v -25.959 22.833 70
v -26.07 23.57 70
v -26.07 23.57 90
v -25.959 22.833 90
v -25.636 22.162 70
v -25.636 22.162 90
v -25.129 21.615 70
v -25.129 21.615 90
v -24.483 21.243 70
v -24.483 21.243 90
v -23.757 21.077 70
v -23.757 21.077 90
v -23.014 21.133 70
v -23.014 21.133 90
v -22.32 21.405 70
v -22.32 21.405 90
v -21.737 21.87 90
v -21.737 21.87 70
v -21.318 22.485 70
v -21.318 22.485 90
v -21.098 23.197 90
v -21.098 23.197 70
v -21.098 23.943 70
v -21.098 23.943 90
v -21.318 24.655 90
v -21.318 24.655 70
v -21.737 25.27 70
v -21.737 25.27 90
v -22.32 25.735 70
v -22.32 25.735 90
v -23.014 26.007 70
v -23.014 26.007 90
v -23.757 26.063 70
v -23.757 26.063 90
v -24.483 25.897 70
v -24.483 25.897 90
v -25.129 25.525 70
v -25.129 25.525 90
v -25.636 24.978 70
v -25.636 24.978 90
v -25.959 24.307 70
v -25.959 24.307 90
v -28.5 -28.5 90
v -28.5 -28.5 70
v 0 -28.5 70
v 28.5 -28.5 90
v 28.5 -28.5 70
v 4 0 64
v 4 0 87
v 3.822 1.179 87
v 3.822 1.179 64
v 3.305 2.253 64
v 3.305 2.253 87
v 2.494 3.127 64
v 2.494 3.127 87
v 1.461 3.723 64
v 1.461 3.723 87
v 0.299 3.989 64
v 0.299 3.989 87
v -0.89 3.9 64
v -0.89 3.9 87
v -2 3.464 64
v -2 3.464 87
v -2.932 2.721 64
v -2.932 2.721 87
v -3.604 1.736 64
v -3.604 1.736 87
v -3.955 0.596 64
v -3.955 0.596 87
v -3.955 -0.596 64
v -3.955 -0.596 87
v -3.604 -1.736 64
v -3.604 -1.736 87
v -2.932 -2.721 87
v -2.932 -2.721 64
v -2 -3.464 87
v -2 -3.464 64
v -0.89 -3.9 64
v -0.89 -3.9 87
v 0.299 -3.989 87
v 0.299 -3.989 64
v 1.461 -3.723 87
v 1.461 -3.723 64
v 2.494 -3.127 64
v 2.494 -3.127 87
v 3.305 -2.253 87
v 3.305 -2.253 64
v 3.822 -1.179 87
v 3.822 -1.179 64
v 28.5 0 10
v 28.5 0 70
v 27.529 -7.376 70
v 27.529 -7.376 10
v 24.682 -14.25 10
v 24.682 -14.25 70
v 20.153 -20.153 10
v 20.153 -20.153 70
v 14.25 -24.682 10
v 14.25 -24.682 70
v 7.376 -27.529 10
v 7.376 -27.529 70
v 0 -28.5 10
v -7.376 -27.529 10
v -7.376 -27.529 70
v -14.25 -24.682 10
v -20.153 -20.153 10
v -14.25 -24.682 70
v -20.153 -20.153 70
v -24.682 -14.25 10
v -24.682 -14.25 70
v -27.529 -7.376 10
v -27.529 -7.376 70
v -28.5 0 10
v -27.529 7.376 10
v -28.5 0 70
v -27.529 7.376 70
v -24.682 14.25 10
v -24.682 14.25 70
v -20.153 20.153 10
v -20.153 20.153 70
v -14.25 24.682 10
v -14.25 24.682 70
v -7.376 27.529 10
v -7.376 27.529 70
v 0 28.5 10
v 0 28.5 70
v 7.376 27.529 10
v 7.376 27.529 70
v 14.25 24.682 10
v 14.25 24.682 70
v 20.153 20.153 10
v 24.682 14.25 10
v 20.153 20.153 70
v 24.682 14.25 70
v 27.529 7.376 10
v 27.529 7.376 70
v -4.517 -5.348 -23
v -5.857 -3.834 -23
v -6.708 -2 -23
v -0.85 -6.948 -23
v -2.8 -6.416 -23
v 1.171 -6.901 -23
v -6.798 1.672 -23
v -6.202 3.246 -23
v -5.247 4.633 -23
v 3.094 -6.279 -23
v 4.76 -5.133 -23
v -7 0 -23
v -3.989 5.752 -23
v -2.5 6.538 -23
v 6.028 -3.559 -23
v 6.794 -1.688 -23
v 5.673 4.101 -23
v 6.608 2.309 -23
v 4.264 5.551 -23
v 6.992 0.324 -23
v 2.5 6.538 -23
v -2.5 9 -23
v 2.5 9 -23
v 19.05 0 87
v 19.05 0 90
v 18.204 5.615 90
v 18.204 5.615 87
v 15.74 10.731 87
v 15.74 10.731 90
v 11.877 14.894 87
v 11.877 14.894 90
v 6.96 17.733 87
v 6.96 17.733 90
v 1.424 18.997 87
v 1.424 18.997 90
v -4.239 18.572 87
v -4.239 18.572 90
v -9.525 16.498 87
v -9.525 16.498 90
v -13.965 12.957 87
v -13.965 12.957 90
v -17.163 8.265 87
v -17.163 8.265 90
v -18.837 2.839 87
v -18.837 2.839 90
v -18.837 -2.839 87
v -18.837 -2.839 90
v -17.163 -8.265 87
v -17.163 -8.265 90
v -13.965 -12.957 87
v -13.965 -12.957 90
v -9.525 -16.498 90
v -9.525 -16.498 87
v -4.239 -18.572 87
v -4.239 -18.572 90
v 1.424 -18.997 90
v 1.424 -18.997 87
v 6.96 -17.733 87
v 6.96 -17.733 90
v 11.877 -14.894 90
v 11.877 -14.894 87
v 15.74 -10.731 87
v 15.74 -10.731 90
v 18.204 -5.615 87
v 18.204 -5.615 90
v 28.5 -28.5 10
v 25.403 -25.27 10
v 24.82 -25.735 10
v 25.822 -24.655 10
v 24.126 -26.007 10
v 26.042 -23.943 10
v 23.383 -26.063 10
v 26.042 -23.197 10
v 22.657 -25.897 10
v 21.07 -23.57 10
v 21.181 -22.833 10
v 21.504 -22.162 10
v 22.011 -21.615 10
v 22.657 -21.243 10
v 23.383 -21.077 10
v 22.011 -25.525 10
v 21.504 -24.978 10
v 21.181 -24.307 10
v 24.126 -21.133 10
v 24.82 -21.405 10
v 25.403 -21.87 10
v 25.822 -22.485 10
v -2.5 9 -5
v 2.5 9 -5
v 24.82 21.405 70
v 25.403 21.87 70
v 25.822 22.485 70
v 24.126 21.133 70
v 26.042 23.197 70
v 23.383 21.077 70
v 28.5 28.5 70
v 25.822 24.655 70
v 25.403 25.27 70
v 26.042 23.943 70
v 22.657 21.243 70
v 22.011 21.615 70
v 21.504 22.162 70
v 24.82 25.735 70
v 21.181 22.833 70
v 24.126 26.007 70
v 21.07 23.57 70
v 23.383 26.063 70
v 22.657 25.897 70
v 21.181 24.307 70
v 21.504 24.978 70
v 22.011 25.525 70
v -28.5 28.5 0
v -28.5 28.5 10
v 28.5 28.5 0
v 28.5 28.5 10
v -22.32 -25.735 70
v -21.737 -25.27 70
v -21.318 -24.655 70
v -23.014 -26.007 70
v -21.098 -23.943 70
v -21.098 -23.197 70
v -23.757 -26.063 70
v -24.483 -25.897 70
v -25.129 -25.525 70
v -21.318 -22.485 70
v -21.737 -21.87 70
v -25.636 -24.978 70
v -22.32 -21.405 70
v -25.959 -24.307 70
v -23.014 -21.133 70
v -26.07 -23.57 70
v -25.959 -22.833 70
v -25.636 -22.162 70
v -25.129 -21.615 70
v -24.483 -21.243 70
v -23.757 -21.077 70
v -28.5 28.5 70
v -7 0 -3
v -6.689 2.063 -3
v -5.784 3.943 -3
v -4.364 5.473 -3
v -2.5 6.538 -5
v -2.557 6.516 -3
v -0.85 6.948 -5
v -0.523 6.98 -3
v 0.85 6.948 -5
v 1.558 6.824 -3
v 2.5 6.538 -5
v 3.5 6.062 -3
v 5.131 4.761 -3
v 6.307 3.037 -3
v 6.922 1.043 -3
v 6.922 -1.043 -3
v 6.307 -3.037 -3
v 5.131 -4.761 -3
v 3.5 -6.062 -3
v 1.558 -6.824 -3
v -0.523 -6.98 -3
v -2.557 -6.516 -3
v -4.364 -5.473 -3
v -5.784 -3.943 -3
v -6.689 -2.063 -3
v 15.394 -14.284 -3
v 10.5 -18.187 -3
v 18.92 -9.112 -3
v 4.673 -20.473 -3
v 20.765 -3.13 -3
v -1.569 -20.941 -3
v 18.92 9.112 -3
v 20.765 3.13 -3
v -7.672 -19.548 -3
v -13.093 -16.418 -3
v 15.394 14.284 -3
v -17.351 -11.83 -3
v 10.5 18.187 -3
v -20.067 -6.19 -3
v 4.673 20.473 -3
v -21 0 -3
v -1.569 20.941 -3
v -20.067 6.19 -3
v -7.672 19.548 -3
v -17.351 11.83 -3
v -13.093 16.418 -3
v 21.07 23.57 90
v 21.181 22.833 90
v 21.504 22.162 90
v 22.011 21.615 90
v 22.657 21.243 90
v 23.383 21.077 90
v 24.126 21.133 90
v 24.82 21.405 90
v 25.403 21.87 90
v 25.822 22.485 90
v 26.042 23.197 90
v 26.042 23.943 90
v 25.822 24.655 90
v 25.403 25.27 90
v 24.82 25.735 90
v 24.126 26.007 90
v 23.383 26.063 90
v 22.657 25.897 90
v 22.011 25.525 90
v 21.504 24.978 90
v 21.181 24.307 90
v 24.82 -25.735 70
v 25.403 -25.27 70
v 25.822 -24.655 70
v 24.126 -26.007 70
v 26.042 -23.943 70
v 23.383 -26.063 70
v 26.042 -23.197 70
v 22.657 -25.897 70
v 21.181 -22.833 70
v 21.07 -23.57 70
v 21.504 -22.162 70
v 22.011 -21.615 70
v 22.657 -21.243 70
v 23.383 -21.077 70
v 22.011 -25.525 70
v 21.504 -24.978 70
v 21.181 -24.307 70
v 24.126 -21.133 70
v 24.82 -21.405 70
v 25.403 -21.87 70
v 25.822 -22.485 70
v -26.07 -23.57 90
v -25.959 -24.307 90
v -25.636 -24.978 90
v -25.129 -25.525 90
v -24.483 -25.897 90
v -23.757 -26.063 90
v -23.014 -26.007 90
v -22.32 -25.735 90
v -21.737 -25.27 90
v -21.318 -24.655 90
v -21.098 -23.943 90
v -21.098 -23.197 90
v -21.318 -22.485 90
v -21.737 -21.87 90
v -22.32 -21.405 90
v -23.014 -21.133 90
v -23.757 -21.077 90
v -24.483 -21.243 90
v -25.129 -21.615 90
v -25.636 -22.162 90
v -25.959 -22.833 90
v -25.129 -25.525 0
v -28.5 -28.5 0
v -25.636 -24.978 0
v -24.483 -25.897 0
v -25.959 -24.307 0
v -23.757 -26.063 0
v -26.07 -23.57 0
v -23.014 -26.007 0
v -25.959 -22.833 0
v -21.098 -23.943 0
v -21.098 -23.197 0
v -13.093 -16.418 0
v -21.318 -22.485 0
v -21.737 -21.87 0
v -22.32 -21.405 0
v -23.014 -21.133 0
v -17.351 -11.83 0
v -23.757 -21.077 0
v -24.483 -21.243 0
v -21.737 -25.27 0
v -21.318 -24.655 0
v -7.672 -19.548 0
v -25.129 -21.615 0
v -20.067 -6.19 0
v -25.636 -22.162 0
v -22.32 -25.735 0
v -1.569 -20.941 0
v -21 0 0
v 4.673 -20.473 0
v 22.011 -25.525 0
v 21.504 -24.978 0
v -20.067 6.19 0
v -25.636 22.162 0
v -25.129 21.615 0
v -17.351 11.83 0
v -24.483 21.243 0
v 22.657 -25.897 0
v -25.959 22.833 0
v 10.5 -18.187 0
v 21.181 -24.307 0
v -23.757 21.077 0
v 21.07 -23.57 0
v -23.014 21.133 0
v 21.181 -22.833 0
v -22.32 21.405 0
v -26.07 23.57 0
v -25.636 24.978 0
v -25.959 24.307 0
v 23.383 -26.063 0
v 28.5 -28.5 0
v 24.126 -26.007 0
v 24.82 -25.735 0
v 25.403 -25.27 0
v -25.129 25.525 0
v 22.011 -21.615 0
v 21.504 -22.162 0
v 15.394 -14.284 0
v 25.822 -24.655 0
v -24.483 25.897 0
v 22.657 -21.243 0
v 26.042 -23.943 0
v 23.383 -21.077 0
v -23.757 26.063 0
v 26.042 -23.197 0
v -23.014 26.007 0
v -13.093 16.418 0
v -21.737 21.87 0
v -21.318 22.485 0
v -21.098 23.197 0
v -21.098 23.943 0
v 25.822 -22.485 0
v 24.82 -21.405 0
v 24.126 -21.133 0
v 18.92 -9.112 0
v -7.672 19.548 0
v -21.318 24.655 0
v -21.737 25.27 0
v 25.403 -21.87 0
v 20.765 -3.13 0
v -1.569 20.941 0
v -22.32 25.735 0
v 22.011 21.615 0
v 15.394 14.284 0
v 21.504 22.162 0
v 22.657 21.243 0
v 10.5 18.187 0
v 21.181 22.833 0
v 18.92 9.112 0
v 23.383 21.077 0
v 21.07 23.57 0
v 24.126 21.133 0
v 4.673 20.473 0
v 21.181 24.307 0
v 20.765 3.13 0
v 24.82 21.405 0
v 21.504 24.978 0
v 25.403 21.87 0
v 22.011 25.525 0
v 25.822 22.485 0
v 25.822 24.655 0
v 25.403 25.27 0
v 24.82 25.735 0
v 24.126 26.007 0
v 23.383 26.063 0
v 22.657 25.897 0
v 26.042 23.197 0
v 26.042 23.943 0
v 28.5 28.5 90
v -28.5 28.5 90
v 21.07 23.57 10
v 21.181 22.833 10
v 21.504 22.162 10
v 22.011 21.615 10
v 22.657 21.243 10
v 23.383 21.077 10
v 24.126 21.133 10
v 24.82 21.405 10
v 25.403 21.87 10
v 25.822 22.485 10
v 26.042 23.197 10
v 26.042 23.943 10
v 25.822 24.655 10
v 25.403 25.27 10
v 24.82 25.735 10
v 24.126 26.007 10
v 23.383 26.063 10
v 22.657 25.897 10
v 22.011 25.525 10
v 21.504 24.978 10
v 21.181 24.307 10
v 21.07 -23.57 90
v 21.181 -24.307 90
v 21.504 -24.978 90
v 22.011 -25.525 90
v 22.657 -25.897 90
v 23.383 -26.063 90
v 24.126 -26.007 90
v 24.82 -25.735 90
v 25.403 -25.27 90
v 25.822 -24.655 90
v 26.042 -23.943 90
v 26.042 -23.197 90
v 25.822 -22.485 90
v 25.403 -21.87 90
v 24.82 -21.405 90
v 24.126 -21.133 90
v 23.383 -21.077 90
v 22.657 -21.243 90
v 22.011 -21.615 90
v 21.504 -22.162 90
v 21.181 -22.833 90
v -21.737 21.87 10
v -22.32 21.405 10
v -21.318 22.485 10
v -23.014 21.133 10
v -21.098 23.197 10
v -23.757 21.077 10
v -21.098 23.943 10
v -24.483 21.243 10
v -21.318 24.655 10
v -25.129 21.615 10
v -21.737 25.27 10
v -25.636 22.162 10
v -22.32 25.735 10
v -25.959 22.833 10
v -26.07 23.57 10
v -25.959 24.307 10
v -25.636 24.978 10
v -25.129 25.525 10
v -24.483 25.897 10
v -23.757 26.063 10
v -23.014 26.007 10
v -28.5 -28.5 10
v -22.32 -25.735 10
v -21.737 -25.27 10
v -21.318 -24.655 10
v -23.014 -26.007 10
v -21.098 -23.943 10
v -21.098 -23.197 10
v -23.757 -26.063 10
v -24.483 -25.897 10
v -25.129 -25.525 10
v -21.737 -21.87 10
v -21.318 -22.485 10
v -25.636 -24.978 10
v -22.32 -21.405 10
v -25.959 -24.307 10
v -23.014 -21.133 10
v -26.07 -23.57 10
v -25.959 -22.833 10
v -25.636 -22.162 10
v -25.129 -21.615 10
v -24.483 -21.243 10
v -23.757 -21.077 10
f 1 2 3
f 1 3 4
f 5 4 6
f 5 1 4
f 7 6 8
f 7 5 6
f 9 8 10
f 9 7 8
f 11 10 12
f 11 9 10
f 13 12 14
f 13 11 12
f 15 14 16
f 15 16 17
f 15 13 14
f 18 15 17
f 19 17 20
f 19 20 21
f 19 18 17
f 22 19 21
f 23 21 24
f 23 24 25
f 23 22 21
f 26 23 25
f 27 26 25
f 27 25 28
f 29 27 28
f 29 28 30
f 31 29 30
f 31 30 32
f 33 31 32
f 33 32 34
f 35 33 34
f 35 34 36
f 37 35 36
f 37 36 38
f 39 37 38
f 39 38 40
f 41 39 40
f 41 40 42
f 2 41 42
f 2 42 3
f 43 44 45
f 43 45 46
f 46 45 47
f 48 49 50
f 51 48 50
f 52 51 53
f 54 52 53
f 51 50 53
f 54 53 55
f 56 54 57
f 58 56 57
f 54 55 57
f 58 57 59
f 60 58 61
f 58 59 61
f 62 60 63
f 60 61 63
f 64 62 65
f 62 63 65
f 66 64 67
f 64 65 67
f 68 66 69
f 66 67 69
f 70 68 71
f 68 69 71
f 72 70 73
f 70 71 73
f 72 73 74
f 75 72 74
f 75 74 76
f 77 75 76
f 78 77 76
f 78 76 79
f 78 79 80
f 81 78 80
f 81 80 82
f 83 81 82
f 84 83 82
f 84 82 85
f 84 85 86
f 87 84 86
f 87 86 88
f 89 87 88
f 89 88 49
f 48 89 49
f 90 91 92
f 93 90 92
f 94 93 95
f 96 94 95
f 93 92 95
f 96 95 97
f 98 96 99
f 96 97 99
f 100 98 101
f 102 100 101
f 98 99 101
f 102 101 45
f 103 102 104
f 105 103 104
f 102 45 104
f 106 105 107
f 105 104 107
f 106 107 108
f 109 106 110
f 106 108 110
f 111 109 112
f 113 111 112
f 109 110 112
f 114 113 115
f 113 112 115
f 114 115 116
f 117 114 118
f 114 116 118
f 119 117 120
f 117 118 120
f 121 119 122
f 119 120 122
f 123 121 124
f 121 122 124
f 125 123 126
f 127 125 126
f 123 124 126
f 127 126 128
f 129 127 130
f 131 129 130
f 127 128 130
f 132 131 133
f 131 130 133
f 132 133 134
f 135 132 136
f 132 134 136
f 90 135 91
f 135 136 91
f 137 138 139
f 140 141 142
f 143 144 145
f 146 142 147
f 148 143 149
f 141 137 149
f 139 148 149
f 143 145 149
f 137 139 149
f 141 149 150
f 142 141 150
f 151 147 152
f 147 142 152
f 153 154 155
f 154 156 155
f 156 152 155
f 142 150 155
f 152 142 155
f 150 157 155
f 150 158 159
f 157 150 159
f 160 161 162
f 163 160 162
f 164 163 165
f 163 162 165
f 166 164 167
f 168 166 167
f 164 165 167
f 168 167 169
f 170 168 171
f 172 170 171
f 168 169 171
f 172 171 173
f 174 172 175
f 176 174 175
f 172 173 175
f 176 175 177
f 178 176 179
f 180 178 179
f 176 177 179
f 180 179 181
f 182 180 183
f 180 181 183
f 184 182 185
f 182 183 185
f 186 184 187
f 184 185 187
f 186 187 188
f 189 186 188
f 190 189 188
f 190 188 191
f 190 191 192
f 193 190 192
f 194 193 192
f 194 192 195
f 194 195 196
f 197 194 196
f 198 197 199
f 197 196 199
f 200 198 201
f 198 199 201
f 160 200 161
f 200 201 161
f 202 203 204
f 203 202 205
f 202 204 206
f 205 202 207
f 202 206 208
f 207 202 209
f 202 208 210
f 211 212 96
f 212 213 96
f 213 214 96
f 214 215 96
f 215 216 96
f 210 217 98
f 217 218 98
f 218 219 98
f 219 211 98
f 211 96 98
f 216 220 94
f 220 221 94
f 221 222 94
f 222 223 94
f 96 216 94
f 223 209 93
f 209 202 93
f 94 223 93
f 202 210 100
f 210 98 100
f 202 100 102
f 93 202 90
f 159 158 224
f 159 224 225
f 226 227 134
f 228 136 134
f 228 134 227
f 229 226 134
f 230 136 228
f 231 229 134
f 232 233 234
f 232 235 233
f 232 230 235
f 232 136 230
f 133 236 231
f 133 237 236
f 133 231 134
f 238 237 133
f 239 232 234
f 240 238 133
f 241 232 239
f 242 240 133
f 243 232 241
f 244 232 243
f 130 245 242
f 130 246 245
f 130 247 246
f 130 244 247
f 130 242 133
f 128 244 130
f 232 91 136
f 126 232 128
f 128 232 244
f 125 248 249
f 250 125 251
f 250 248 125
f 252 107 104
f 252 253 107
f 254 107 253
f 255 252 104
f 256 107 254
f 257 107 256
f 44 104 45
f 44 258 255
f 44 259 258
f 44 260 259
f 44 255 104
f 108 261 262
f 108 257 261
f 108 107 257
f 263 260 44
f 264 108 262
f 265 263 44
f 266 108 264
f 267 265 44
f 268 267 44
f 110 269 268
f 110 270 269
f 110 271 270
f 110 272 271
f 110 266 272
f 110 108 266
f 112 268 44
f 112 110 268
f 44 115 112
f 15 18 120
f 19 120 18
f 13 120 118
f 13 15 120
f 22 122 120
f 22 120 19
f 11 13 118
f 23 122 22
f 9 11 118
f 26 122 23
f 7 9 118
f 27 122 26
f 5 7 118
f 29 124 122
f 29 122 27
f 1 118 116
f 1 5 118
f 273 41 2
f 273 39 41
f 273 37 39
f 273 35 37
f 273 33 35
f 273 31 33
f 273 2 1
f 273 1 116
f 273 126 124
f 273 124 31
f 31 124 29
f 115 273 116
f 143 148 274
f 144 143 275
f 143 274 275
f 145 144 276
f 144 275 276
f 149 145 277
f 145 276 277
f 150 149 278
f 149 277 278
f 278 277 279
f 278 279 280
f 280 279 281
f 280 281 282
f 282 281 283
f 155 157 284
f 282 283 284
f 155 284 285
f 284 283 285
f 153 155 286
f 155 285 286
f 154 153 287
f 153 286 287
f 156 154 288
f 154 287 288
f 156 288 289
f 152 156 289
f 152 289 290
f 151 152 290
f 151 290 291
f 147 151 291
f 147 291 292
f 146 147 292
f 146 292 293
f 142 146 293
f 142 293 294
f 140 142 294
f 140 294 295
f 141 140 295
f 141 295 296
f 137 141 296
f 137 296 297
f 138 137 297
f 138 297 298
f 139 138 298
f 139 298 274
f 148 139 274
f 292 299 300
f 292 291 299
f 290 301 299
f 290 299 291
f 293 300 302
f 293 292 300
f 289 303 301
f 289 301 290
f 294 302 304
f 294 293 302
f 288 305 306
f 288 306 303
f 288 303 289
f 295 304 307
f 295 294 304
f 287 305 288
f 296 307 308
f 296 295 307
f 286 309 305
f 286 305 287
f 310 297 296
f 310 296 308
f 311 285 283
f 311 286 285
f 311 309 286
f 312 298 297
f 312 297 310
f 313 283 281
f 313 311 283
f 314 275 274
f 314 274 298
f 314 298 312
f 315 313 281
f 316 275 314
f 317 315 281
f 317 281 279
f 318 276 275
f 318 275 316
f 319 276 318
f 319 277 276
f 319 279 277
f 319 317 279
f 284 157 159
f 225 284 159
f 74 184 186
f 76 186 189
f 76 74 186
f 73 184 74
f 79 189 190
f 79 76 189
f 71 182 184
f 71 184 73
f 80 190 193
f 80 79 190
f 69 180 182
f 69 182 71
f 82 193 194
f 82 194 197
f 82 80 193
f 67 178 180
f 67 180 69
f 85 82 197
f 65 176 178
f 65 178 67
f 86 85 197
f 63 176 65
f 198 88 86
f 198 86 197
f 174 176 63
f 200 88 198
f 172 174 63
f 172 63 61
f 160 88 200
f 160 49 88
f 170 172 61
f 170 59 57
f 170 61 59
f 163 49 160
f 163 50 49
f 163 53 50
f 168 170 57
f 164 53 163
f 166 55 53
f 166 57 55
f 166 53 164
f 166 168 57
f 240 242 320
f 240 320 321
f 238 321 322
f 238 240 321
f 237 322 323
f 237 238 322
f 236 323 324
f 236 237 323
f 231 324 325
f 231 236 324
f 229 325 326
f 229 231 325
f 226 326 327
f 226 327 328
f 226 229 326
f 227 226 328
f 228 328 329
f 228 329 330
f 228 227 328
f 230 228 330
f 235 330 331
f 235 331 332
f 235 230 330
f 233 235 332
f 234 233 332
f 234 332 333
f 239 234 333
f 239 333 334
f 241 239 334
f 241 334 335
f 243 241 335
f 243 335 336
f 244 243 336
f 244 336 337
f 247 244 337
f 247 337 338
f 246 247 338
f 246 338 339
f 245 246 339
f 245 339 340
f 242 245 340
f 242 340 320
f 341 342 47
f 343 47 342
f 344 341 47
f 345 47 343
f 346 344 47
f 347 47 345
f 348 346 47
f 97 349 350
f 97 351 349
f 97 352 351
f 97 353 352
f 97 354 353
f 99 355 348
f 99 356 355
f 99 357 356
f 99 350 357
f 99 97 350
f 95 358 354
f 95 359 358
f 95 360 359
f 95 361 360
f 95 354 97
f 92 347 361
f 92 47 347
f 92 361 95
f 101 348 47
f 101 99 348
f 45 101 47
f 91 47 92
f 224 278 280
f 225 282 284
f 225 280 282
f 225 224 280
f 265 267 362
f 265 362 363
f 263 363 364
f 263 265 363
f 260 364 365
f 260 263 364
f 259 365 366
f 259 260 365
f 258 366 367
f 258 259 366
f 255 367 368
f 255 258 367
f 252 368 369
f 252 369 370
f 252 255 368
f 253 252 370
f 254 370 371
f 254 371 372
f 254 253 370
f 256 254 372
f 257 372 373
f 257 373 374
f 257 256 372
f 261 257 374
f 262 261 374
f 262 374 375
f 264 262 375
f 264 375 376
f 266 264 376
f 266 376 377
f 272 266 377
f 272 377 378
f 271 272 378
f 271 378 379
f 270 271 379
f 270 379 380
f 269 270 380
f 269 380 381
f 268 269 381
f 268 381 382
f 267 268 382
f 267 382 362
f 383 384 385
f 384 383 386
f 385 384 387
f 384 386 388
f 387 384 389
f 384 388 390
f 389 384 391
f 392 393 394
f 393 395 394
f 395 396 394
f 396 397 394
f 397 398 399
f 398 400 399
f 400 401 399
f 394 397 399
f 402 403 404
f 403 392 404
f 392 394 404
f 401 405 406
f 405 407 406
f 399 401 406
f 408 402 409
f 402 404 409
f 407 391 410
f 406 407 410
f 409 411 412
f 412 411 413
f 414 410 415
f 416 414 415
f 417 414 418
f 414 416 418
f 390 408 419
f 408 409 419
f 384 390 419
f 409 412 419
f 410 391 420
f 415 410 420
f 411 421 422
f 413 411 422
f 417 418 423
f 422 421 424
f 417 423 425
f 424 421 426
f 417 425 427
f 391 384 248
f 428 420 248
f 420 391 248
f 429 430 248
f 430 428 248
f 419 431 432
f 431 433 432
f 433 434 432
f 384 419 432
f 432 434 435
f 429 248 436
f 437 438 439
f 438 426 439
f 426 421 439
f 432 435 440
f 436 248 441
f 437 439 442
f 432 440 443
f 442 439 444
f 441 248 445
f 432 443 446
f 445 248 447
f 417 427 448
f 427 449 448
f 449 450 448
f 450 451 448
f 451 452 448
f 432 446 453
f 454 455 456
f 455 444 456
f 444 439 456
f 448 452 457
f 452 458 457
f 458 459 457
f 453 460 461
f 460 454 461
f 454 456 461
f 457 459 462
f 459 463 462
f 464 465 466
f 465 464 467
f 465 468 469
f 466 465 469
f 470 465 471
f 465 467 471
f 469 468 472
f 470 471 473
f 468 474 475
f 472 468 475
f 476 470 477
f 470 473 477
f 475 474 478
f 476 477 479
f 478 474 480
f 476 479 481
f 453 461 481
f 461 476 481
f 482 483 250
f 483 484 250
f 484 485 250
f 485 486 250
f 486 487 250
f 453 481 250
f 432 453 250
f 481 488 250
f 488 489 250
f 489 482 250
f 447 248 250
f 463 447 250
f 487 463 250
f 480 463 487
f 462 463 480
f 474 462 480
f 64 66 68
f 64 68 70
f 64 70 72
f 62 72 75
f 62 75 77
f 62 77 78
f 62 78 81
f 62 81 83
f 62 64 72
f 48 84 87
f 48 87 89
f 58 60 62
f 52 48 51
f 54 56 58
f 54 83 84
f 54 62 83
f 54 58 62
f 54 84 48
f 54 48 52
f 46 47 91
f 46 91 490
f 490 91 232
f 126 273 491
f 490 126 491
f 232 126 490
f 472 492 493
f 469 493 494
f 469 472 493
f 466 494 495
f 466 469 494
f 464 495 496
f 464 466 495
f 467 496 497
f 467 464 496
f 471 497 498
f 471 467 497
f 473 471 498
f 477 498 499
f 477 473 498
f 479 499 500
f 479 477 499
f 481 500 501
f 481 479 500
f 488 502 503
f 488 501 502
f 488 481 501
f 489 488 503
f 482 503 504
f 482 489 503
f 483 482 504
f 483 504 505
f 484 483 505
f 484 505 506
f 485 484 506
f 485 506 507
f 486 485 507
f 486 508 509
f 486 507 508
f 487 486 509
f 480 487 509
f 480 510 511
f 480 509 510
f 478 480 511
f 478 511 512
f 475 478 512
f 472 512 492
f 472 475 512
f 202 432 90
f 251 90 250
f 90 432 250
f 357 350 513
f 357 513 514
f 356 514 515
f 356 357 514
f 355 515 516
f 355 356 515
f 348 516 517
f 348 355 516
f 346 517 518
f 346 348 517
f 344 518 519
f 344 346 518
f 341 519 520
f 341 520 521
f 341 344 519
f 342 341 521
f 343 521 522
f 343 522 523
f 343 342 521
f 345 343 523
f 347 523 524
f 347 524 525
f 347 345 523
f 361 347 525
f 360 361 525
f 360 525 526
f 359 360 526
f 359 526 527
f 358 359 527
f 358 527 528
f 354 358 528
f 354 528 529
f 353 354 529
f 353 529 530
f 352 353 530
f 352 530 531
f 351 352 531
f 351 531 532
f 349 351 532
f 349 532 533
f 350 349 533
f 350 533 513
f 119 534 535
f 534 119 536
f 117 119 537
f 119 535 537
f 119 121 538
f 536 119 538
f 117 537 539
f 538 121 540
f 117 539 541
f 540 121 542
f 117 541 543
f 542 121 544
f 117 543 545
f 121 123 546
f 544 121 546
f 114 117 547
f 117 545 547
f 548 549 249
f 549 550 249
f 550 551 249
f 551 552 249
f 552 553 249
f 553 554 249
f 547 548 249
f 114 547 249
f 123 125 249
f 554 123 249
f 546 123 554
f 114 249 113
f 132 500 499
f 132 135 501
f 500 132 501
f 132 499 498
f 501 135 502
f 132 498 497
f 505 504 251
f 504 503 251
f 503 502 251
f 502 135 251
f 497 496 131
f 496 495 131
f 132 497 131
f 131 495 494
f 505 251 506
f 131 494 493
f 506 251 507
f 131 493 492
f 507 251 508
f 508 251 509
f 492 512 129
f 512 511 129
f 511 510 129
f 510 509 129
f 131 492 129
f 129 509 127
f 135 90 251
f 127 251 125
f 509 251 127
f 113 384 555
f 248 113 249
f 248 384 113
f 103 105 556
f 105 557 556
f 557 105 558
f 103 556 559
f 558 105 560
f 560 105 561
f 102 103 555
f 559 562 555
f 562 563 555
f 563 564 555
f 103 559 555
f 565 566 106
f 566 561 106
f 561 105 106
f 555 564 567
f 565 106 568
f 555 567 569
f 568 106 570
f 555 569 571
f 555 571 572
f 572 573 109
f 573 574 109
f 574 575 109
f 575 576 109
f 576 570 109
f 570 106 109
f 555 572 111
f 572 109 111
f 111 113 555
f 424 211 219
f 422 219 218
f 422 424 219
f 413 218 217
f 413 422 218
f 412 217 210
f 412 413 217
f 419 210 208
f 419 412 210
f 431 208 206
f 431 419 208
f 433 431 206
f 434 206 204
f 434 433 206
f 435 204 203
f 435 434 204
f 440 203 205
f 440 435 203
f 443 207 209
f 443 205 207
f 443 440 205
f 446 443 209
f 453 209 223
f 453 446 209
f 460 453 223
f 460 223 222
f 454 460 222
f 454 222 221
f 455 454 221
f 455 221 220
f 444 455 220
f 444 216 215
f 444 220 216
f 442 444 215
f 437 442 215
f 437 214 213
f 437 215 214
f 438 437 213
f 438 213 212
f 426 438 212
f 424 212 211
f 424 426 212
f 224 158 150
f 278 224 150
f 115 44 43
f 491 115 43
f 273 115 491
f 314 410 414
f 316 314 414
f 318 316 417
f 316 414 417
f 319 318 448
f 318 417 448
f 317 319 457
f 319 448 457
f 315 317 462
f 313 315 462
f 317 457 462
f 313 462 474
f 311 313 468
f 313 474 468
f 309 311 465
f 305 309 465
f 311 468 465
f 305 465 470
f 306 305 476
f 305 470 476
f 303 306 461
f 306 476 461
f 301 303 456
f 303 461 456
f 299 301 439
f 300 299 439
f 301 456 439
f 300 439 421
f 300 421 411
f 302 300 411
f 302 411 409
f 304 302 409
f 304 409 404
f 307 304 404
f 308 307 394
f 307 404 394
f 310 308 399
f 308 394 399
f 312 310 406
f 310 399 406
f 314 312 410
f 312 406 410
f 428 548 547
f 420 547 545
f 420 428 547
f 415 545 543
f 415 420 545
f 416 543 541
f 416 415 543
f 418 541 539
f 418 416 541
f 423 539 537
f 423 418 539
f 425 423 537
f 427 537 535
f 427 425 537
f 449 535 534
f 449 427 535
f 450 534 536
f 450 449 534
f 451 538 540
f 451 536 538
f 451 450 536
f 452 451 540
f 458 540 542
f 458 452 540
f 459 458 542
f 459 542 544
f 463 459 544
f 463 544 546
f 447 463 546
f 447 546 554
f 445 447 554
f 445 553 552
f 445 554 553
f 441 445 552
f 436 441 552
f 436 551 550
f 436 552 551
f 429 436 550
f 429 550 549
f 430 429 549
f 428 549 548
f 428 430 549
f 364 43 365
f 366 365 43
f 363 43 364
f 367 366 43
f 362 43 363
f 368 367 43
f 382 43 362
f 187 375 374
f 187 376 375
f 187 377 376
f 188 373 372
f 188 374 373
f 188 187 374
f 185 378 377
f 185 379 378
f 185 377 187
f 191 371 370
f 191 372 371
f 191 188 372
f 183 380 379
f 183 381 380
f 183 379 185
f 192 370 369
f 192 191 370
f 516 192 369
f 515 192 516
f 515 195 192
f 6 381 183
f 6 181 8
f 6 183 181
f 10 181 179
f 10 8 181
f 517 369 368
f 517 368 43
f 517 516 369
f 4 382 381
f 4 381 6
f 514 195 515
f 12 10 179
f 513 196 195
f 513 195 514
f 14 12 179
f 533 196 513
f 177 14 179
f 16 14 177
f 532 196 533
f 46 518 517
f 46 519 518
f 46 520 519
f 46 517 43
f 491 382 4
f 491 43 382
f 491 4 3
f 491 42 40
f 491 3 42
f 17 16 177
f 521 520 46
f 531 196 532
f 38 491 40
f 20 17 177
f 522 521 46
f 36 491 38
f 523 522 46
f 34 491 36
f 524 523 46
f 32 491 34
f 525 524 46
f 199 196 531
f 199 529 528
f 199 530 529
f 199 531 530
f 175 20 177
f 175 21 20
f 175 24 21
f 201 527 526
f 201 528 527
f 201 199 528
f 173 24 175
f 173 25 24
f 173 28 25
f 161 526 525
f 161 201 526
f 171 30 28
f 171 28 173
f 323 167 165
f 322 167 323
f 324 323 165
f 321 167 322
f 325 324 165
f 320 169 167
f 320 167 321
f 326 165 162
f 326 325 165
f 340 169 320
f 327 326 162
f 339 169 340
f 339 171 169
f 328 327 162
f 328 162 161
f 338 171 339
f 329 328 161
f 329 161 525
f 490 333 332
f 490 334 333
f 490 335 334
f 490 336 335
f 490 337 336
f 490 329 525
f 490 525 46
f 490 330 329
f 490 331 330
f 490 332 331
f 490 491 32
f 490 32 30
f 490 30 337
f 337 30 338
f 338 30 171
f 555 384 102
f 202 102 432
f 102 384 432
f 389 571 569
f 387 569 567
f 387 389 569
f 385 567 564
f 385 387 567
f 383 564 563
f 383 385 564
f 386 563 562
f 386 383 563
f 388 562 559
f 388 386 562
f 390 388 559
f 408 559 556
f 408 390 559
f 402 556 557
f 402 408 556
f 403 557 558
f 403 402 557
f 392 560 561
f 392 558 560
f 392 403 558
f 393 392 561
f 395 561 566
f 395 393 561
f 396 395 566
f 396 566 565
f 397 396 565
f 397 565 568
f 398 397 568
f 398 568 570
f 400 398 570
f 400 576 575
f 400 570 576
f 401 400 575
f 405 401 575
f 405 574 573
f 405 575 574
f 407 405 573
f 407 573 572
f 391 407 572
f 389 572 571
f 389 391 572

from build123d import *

# Parameters (mm, degrees)
SKETCH_1_W               = 57
SKETCH_1_H               = 57
SKETCH_1_R               = 2.5
EXTRUDE_1_DEPTH          = 90
CUT_EXTRUDE_1_DEPTH      = 35
CUT_EXTRUDE_1_DEPTH_BACK = 25
SKETCH_2_W               = 108.428047284
SKETCH_2_H               = 112.732753546
SKETCH_2_R               = 28.5
SKETCH_3_R               = 21
EXTRUDE_2_DEPTH          = 3
SKETCH_4_R               = 7
EXTRUDE_3_DEPTH          = 20
SKETCH_5_R               = 4
CUT_EXTRUDE_2_DEPTH      = 26
SKETCH_6_R               = 19.05
CUT_EXTRUDE_3_DEPTH      = 3
EXTRUDE_4_DEPTH          = 18


with BuildPart() as part:
    # 草图1 → 凸台-拉伸1 (new body)
    with BuildSketch(Plane.XY):
        Rectangle(SKETCH_1_W, SKETCH_1_H)
        with Locations(Location((-23.57, 23.57, 0), (0, 0, 180))):
            Circle(SKETCH_1_R, mode=Mode.SUBTRACT)
        with Locations(Location((23.57, 23.57, 0), (0, 0, 180))):
            Circle(SKETCH_1_R, mode=Mode.SUBTRACT)
        with Locations(Location((23.57, -23.57, 0), (0, 0, 180))):
            Circle(SKETCH_1_R, mode=Mode.SUBTRACT)
        with Locations(Location((-23.57, -23.57, 0), (0, 0, 180))):
            Circle(SKETCH_1_R, mode=Mode.SUBTRACT)
    extrude(amount=EXTRUDE_1_DEPTH)

    # 草图2 → 切除-拉伸1 (cut, two sides: drawn at the far end of the back side and taken through both)
    with BuildSketch(Plane(origin=(0, 0, 45), x_dir=(-1, 0, 0), z_dir=(0, 0, -1)).offset(-CUT_EXTRUDE_1_DEPTH_BACK)):
        Rectangle(SKETCH_2_W, SKETCH_2_H)
        with Locations(Location((0, 0, 0), (0, 0, 180))):
            Circle(SKETCH_2_R, mode=Mode.SUBTRACT)
    extrude(amount=CUT_EXTRUDE_1_DEPTH + CUT_EXTRUDE_1_DEPTH_BACK, mode=Mode.SUBTRACT)

    # 草图3 → 凸台-拉伸2 (add)
    with BuildSketch(Plane(origin=(0, 0, 0), x_dir=(-1, 0, 0), z_dir=(0, 0, -1))):
        Circle(SKETCH_3_R)
    extrude(amount=EXTRUDE_2_DEPTH)

    # 草图4 → 凸台-拉伸3 (add)
    with BuildSketch(Plane(origin=(0, 0, -3), x_dir=(-1, 0, 0), z_dir=(0, 0, -1))):
        Circle(SKETCH_4_R)
    extrude(amount=EXTRUDE_3_DEPTH)

    # 草图5 → 切除-拉伸2 (cut)
    with BuildSketch(Plane.XY.offset(90)):
        Circle(SKETCH_5_R)
    extrude(amount=-CUT_EXTRUDE_2_DEPTH, mode=Mode.SUBTRACT)

    # 草图6 → 切除-拉伸3 (cut)
    with BuildSketch(Plane.XY.offset(90)):
        Circle(SKETCH_6_R)
    extrude(amount=-CUT_EXTRUDE_3_DEPTH, mode=Mode.SUBTRACT)

    # 草图7 → 凸台-拉伸4 (add)
    with BuildSketch(Plane(origin=(0, 0, -23), x_dir=(-1, 0, 0), z_dir=(0, 0, -1))):
        Polygon((0, 9), (2.5, 9), (2.5, 0), (-2.5, 0), (-2.5, 9), align=None)
    extrude(amount=-EXTRUDE_4_DEPTH)


solid = part.part
